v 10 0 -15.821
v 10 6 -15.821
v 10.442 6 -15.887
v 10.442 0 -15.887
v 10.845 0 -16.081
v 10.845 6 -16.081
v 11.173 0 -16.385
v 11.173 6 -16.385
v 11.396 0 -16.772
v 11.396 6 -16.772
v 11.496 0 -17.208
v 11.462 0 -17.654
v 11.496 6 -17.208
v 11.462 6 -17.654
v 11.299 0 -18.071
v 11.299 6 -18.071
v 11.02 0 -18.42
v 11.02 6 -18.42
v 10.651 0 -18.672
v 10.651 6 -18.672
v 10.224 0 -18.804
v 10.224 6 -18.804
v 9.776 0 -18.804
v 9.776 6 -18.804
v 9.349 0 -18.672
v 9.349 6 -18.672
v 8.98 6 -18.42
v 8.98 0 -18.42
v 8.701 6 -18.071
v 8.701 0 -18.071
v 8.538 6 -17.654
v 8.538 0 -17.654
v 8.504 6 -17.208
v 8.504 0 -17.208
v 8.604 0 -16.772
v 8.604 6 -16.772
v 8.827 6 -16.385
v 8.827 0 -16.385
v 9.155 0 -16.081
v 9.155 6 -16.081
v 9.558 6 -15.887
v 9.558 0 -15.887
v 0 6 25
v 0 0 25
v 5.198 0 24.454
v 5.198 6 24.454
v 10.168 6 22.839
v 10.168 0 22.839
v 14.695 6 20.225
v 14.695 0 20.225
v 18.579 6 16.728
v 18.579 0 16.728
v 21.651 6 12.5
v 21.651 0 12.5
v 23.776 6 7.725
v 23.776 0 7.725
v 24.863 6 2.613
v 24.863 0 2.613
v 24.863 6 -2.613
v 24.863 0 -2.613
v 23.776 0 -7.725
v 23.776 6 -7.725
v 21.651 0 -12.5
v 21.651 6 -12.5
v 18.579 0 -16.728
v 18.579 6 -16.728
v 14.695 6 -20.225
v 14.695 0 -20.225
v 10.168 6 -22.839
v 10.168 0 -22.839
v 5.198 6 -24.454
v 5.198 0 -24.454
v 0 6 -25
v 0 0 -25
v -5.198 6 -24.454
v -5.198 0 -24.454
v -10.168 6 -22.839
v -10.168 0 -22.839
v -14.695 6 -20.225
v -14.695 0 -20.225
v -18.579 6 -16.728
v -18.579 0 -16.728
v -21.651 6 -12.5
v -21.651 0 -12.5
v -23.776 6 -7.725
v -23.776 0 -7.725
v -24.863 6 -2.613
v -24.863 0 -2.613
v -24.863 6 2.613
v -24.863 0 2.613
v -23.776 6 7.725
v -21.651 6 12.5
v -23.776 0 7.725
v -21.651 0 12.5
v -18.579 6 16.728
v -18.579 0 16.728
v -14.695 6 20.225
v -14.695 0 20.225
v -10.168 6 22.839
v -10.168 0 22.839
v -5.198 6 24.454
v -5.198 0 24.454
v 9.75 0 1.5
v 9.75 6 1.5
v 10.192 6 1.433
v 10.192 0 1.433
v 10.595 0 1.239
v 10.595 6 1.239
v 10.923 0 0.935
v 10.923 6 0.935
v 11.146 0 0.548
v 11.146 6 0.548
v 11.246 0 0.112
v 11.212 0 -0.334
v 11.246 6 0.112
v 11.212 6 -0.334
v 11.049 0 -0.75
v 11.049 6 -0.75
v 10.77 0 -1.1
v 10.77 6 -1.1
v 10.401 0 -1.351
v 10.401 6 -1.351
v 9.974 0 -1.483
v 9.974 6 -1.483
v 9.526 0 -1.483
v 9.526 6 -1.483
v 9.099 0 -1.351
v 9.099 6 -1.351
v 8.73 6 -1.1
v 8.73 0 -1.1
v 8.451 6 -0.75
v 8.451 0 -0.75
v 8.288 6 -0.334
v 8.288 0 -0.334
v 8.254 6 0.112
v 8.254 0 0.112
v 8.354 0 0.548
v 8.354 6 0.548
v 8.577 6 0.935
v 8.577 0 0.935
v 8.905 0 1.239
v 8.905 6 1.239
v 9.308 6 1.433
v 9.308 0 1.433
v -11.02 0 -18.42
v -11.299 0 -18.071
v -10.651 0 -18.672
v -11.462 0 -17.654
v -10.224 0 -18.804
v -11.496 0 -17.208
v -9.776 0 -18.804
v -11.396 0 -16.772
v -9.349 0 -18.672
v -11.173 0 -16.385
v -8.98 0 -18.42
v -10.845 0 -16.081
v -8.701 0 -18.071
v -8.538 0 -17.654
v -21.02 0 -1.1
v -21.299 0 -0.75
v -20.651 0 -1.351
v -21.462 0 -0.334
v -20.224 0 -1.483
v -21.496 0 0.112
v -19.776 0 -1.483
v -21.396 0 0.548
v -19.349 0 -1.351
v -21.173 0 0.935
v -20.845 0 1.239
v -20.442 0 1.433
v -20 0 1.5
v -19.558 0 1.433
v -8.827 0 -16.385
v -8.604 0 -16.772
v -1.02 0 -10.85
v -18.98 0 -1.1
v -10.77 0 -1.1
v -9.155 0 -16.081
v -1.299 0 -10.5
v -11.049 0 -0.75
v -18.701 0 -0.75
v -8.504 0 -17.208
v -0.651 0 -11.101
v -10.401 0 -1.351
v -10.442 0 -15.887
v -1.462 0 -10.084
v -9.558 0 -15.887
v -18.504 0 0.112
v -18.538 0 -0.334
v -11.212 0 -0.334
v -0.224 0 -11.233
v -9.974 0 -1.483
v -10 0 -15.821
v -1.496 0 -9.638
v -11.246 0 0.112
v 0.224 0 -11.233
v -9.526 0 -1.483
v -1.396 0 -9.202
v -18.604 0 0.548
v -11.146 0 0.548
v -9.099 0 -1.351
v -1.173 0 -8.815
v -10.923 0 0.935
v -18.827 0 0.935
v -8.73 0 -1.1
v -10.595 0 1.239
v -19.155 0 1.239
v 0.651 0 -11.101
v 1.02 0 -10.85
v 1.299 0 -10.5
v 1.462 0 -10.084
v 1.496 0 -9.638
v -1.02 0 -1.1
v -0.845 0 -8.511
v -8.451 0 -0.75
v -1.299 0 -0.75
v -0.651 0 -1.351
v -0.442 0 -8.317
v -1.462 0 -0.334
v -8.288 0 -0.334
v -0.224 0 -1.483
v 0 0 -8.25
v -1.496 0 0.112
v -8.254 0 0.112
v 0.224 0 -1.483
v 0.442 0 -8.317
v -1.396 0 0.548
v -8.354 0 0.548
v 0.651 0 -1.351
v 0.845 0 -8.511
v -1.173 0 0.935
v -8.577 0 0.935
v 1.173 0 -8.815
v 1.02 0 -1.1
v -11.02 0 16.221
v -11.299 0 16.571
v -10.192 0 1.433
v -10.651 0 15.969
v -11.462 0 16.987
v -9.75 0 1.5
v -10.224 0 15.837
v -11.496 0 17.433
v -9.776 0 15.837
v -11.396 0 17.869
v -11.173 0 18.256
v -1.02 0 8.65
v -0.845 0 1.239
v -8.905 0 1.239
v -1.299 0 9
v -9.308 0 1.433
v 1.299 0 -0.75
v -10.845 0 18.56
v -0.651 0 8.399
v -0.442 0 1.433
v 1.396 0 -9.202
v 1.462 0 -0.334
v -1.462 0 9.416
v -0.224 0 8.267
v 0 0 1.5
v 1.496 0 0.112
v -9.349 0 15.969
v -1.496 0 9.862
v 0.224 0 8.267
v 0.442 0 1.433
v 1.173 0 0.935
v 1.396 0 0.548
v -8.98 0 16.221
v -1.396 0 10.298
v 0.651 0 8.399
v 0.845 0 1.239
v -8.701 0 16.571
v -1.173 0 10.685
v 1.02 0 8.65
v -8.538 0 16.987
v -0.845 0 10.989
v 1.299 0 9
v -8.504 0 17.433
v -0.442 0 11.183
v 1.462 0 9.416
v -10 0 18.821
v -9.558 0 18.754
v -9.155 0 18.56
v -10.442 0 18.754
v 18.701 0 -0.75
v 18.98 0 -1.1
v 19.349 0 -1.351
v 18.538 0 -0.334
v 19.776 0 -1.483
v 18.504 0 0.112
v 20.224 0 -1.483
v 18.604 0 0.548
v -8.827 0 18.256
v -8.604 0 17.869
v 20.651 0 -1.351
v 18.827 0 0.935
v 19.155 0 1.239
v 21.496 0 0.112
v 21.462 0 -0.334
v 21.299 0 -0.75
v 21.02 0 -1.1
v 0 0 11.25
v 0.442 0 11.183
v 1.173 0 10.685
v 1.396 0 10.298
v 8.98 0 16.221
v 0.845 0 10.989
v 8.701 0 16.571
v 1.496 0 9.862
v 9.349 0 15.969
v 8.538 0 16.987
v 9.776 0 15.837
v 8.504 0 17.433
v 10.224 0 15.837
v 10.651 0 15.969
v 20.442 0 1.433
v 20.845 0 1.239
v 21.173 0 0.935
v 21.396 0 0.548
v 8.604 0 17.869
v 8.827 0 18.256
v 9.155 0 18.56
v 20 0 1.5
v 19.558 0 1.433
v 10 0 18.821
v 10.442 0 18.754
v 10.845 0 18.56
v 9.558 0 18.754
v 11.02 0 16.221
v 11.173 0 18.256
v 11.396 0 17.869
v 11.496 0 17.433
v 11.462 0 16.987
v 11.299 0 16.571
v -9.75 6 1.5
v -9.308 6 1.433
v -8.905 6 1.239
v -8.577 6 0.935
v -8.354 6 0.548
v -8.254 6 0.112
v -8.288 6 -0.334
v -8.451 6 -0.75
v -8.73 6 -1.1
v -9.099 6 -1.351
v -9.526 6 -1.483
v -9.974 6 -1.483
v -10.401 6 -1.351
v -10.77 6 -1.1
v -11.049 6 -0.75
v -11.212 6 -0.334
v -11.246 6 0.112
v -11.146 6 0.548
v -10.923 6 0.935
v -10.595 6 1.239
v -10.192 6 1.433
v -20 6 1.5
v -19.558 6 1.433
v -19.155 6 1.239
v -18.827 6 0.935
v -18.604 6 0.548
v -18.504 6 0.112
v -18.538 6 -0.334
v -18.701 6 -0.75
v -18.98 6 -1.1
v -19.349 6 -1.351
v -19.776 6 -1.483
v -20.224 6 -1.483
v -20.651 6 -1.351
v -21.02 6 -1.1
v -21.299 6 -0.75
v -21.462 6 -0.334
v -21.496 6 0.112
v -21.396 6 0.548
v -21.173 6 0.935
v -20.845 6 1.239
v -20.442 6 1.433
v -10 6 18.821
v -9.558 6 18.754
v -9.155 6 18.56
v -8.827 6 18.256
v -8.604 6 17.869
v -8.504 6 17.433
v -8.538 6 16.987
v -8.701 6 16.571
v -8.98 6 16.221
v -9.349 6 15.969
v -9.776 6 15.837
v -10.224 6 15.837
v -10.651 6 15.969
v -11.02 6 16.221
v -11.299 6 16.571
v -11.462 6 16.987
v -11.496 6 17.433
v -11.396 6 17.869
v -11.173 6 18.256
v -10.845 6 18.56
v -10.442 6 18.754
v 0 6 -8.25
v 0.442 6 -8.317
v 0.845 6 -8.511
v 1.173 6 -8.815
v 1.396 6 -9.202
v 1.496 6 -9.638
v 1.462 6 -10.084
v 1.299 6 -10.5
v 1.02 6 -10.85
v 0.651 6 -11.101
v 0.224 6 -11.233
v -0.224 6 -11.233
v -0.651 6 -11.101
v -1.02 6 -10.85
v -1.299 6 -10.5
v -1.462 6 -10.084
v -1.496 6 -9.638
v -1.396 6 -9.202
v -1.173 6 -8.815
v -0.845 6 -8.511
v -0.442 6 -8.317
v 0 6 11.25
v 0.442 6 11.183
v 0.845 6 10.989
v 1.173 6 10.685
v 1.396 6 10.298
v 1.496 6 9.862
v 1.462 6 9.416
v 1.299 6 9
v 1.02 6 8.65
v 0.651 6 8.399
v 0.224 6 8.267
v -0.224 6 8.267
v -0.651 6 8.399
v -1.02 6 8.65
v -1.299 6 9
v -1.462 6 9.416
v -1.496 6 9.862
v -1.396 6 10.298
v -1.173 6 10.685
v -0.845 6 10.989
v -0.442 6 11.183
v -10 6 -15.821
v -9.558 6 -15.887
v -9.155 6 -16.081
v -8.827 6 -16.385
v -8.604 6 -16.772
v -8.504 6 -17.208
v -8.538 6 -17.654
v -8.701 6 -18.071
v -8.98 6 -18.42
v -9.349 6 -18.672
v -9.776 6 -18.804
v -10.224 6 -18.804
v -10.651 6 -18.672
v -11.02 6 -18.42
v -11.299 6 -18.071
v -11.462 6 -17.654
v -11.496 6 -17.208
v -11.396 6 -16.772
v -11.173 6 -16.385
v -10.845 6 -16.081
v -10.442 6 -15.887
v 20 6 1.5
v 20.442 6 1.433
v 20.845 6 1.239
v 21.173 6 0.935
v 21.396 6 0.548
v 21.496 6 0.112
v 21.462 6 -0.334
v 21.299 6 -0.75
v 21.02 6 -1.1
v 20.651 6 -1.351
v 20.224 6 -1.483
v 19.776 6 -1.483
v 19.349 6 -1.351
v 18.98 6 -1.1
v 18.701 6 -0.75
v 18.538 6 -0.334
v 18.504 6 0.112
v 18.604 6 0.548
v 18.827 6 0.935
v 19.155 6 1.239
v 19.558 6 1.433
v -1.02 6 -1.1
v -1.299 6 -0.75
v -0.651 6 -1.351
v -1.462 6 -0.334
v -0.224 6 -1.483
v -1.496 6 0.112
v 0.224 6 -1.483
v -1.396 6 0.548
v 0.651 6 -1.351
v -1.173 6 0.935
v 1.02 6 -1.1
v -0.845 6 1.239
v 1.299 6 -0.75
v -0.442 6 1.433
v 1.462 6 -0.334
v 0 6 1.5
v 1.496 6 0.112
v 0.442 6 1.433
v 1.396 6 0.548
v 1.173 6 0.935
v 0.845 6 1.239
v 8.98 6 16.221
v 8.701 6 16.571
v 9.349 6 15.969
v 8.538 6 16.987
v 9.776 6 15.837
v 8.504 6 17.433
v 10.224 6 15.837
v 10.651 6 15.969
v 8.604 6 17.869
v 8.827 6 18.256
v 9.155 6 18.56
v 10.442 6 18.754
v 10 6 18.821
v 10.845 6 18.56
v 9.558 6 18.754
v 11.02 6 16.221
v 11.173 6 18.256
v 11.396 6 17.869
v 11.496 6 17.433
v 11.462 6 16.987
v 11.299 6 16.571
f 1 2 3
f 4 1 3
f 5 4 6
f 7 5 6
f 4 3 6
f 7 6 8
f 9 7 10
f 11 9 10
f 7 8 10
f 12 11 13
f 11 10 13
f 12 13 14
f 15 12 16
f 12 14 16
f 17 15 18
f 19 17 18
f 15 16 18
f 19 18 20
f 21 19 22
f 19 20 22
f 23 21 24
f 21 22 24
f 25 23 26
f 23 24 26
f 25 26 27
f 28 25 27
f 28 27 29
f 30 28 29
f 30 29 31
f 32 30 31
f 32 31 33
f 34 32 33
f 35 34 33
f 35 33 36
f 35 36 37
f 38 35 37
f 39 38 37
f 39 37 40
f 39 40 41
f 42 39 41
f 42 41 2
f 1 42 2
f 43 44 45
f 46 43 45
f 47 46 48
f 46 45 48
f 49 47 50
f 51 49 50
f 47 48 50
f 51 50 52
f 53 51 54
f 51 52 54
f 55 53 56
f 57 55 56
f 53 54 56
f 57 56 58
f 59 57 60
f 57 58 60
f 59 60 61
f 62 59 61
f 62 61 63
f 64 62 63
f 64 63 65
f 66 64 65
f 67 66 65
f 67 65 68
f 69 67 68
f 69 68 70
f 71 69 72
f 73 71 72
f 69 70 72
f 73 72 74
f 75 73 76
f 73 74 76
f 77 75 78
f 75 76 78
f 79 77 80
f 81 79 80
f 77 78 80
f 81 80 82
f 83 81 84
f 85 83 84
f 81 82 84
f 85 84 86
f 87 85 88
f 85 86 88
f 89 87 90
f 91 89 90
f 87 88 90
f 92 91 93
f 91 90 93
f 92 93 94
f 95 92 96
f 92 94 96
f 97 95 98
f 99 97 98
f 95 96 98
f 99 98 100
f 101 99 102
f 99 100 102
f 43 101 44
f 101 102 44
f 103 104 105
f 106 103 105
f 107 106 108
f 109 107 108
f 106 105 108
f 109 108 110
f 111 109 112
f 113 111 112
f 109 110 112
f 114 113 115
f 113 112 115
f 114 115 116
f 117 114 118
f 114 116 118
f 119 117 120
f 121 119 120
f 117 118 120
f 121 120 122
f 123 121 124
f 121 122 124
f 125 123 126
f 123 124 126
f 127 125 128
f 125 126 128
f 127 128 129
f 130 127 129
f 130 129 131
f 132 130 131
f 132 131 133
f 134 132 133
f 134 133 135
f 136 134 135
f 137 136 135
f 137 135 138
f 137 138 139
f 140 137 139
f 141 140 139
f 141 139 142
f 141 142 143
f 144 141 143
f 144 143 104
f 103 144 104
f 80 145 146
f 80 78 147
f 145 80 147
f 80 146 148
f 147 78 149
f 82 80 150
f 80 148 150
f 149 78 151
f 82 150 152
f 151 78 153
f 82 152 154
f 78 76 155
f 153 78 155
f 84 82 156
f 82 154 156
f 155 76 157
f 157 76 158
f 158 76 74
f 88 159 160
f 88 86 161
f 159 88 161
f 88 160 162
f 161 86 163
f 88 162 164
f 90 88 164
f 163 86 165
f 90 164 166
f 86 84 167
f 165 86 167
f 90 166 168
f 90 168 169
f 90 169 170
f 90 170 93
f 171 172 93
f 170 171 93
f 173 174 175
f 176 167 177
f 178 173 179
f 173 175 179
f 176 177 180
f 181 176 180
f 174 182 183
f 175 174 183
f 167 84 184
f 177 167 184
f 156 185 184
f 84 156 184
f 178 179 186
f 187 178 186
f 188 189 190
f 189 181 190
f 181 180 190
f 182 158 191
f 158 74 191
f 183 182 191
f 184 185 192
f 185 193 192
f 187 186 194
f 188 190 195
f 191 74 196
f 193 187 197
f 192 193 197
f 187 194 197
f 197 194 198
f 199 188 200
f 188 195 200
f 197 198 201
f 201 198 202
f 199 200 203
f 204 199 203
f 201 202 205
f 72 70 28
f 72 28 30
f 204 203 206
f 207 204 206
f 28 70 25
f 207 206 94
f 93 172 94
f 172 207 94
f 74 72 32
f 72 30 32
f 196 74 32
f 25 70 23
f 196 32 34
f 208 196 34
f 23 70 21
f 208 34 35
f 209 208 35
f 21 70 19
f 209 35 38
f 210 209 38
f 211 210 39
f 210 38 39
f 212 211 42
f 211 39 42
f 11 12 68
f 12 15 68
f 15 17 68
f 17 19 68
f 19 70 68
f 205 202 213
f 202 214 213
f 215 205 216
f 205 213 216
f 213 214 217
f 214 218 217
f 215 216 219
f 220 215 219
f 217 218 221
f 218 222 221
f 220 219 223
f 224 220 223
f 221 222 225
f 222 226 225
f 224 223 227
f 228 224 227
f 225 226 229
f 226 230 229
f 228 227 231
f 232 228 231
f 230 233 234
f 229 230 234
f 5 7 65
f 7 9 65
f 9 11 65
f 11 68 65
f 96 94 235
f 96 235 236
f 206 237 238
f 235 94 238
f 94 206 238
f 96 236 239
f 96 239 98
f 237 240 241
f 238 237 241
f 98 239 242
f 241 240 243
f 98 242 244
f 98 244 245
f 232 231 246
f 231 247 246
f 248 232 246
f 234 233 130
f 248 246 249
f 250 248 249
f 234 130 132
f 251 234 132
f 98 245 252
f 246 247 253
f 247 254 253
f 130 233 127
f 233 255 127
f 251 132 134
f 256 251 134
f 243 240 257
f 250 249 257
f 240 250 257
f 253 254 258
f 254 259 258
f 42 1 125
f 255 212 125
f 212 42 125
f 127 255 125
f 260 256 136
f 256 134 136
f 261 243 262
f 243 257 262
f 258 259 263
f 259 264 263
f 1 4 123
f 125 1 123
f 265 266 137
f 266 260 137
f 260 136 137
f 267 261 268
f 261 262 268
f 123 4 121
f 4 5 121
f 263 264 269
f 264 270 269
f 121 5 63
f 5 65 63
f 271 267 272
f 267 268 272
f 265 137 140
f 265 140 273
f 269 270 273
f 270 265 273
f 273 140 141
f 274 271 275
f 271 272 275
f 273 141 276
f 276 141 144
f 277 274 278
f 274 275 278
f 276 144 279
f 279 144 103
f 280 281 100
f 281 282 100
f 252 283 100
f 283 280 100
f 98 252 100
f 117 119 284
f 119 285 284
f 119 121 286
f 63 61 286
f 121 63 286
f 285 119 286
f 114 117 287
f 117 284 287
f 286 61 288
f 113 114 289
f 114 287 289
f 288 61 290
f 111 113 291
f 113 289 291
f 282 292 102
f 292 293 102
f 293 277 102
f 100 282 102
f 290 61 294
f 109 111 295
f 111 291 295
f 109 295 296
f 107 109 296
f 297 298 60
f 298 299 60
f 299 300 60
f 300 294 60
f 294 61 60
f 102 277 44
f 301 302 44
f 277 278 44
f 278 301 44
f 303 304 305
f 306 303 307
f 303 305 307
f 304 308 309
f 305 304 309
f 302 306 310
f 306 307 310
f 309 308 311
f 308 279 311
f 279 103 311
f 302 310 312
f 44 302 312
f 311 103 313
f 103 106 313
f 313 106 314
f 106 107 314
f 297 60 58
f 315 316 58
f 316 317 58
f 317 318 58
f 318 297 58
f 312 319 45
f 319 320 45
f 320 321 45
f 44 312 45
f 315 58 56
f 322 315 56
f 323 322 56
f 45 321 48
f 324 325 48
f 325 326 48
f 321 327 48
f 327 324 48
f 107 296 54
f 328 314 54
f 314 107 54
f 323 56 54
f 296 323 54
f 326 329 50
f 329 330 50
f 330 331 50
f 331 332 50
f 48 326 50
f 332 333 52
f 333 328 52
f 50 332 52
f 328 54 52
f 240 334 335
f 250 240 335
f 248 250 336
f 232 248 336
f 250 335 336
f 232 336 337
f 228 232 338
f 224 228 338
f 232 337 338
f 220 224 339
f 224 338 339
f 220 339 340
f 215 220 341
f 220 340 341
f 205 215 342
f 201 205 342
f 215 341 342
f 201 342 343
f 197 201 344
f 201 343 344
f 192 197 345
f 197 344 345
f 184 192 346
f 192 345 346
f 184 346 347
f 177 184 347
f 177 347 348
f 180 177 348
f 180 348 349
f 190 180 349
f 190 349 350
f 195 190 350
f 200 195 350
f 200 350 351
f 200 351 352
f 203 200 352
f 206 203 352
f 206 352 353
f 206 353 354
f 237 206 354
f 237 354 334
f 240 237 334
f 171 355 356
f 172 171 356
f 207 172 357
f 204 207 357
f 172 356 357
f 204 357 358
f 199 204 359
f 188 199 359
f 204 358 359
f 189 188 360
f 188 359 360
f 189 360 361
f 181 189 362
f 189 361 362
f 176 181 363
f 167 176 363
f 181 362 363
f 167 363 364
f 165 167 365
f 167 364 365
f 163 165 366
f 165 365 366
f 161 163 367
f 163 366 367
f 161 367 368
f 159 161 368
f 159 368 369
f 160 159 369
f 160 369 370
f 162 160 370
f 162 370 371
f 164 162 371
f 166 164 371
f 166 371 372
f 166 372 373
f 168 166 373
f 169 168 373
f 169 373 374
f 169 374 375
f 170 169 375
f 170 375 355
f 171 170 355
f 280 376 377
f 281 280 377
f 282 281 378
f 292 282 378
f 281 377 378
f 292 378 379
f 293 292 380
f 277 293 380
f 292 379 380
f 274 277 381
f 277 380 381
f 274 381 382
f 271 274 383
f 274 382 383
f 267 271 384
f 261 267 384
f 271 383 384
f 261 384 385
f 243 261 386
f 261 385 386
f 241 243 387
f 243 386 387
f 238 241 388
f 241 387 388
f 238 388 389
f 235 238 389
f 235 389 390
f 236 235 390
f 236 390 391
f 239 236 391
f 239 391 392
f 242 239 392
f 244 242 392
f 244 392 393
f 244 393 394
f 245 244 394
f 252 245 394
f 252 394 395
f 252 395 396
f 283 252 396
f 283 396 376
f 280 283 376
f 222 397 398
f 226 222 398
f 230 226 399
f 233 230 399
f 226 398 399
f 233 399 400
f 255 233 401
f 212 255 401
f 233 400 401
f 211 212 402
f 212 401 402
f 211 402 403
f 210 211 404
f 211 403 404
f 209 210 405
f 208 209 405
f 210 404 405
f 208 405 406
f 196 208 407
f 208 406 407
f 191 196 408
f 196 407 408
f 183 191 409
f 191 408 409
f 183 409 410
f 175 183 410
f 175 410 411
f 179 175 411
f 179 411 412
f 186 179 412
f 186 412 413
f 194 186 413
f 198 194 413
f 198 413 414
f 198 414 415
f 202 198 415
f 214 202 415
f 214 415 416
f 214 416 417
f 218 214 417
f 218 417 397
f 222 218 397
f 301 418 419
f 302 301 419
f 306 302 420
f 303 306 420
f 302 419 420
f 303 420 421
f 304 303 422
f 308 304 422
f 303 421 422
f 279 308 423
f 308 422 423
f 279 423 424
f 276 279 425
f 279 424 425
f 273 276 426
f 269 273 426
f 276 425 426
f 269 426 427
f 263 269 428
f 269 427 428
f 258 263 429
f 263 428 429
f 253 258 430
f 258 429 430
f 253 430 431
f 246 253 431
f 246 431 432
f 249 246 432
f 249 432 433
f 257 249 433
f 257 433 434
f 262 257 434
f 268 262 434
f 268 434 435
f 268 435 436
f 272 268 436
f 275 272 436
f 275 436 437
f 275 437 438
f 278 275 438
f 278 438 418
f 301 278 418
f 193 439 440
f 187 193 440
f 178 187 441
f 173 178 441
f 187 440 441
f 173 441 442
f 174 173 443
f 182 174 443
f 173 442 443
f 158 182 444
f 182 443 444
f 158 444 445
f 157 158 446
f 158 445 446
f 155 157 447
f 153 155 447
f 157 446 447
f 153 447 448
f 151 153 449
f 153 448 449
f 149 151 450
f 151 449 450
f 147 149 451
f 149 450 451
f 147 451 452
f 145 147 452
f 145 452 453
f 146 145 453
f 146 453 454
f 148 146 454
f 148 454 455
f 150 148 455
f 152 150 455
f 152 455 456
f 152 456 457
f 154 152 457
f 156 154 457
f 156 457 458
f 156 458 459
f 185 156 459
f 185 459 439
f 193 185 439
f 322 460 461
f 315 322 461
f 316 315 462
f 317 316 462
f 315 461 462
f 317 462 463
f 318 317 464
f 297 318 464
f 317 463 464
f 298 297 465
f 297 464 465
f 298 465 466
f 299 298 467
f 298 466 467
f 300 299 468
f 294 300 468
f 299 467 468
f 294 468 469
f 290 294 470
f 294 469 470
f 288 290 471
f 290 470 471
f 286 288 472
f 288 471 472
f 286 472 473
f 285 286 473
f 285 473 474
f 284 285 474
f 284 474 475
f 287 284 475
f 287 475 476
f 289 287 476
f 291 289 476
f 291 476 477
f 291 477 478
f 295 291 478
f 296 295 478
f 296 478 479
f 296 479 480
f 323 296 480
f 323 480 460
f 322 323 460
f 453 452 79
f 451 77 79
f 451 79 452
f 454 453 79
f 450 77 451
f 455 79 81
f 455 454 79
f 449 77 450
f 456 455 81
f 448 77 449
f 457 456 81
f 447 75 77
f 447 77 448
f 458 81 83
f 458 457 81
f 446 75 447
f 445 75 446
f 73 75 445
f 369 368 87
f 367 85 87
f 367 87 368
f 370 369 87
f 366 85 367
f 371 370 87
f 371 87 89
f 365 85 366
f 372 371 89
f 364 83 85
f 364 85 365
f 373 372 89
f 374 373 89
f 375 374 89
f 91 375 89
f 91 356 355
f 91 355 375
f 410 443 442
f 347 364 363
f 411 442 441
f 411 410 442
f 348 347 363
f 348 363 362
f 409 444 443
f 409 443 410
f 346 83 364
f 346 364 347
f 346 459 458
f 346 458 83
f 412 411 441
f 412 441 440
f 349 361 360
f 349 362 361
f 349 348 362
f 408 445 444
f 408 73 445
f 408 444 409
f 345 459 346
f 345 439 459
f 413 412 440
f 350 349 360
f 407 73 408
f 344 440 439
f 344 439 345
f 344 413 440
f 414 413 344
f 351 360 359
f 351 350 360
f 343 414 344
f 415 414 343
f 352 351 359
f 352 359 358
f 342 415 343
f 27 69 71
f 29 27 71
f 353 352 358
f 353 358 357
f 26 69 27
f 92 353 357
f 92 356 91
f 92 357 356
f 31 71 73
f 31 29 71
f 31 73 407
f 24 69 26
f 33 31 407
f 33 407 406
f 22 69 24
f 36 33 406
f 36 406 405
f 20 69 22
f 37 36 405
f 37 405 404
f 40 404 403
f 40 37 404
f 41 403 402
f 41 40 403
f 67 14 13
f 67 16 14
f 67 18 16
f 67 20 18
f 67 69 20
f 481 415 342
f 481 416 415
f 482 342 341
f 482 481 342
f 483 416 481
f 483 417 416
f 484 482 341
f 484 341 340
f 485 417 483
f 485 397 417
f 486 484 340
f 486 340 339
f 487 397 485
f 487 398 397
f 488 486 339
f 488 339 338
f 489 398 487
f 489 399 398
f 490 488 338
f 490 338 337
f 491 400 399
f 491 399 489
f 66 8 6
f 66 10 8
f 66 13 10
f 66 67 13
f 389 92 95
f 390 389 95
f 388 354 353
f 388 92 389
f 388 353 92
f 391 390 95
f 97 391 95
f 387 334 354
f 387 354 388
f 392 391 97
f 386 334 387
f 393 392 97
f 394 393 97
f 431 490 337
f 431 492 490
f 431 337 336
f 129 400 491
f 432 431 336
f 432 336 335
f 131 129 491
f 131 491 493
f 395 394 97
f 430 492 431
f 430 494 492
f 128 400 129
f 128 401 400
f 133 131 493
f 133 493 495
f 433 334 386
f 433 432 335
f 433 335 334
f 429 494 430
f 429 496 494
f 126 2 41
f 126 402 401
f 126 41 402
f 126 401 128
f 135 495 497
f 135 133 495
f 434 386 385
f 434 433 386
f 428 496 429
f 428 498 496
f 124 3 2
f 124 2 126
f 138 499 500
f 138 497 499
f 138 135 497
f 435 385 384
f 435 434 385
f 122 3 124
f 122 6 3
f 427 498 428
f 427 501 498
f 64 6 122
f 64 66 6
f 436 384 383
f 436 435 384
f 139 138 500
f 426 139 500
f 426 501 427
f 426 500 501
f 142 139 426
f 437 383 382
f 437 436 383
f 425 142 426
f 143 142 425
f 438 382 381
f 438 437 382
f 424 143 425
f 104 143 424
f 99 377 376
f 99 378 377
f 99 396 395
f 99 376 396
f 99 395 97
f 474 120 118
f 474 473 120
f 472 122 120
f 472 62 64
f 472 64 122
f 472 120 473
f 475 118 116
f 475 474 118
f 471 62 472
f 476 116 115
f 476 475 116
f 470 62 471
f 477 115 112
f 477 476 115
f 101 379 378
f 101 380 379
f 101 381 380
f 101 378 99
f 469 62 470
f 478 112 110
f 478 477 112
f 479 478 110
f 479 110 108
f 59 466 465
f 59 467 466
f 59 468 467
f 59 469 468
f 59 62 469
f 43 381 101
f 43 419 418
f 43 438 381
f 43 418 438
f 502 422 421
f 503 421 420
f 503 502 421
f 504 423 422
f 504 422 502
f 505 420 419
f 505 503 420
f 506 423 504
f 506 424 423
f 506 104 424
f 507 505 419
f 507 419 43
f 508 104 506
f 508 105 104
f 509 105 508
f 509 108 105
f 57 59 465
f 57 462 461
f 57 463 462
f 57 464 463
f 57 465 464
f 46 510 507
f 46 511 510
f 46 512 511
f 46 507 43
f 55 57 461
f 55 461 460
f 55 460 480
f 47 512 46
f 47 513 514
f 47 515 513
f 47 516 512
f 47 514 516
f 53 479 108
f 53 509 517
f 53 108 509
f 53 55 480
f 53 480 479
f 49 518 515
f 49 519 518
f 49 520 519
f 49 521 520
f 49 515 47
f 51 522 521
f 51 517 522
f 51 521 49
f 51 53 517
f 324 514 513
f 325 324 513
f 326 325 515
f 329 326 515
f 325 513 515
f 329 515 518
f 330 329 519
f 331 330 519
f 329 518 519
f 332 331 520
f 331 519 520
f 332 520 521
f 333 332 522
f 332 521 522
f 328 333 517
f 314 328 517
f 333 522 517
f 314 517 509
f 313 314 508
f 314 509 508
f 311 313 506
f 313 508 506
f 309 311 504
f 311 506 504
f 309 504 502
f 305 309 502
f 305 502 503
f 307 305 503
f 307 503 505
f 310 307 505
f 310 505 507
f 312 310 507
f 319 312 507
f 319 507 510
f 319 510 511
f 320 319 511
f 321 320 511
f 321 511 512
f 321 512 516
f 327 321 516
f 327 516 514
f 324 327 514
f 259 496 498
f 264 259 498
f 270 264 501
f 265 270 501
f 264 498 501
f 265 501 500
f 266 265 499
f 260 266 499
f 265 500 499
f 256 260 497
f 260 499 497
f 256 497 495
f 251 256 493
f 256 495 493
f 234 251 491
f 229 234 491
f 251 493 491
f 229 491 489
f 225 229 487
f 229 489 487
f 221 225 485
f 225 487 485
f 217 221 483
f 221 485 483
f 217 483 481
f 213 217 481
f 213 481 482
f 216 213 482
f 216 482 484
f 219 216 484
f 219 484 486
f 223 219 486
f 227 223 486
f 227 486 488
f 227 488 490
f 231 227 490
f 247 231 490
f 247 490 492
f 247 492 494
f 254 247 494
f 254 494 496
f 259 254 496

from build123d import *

# Parameters (mm, degrees)
SKETCH_1_R          = 25
EXTRUDE_1_DEPTH     = 6
SKETCH_2_R          = 1.5
CUT_EXTRUDE_1_DEPTH = 10


with BuildPart() as part:
    # 草图1 → 凸台-拉伸1 (new body)
    with BuildSketch(Plane(origin=(0, 0, 0), x_dir=(1, 0, 0), z_dir=(0, 1, 0))):
        with Locations(Location((0, 0, 0), (0, 0, 270))):
            Circle(SKETCH_1_R)
    extrude(amount=EXTRUDE_1_DEPTH)

    # 草图2 → 切除-拉伸1 (cut)
    with BuildSketch(Plane(origin=(0, 6, 0), x_dir=(1, 0, 0), z_dir=(0, 1, 0))):
        with Locations(Location((9.75, 0, 0), (0, 0, 270))):
            Circle(SKETCH_2_R)
        with Locations(Location((0, -9.75, 0), (0, 0, 270))):
            Circle(SKETCH_2_R)
        with Locations(Location((-9.75, 0, 0), (0, 0, 270))):
            Circle(SKETCH_2_R)
        with Locations(Location((0, 9.75, 0), (0, 0, 270))):
            Circle(SKETCH_2_R)
        with Locations(Location((0, 0, 0), (0, 0, 270))):
            Circle(SKETCH_2_R)
        with Locations(Location((-20, 0, 0), (0, 0, 270))):
            Circle(SKETCH_2_R)
        with Locations(Location((-10, 17.320508076, 0), (0, 0, 270))):
            Circle(SKETCH_2_R)
        with Locations(Location((10, 17.320508076, 0), (0, 0, 270))):
            Circle(SKETCH_2_R)
        with Locations(Location((20, 0, 0), (0, 0, 270))):
            Circle(SKETCH_2_R)
        with Locations(Location((10, -17.320508076, 0), (0, 0, 270))):
            Circle(SKETCH_2_R)
        with Locations(Location((-10, -17.320508076, 0), (0, 0, 270))):
            Circle(SKETCH_2_R)
    extrude(amount=-CUT_EXTRUDE_1_DEPTH, mode=Mode.SUBTRACT)


solid = part.part
